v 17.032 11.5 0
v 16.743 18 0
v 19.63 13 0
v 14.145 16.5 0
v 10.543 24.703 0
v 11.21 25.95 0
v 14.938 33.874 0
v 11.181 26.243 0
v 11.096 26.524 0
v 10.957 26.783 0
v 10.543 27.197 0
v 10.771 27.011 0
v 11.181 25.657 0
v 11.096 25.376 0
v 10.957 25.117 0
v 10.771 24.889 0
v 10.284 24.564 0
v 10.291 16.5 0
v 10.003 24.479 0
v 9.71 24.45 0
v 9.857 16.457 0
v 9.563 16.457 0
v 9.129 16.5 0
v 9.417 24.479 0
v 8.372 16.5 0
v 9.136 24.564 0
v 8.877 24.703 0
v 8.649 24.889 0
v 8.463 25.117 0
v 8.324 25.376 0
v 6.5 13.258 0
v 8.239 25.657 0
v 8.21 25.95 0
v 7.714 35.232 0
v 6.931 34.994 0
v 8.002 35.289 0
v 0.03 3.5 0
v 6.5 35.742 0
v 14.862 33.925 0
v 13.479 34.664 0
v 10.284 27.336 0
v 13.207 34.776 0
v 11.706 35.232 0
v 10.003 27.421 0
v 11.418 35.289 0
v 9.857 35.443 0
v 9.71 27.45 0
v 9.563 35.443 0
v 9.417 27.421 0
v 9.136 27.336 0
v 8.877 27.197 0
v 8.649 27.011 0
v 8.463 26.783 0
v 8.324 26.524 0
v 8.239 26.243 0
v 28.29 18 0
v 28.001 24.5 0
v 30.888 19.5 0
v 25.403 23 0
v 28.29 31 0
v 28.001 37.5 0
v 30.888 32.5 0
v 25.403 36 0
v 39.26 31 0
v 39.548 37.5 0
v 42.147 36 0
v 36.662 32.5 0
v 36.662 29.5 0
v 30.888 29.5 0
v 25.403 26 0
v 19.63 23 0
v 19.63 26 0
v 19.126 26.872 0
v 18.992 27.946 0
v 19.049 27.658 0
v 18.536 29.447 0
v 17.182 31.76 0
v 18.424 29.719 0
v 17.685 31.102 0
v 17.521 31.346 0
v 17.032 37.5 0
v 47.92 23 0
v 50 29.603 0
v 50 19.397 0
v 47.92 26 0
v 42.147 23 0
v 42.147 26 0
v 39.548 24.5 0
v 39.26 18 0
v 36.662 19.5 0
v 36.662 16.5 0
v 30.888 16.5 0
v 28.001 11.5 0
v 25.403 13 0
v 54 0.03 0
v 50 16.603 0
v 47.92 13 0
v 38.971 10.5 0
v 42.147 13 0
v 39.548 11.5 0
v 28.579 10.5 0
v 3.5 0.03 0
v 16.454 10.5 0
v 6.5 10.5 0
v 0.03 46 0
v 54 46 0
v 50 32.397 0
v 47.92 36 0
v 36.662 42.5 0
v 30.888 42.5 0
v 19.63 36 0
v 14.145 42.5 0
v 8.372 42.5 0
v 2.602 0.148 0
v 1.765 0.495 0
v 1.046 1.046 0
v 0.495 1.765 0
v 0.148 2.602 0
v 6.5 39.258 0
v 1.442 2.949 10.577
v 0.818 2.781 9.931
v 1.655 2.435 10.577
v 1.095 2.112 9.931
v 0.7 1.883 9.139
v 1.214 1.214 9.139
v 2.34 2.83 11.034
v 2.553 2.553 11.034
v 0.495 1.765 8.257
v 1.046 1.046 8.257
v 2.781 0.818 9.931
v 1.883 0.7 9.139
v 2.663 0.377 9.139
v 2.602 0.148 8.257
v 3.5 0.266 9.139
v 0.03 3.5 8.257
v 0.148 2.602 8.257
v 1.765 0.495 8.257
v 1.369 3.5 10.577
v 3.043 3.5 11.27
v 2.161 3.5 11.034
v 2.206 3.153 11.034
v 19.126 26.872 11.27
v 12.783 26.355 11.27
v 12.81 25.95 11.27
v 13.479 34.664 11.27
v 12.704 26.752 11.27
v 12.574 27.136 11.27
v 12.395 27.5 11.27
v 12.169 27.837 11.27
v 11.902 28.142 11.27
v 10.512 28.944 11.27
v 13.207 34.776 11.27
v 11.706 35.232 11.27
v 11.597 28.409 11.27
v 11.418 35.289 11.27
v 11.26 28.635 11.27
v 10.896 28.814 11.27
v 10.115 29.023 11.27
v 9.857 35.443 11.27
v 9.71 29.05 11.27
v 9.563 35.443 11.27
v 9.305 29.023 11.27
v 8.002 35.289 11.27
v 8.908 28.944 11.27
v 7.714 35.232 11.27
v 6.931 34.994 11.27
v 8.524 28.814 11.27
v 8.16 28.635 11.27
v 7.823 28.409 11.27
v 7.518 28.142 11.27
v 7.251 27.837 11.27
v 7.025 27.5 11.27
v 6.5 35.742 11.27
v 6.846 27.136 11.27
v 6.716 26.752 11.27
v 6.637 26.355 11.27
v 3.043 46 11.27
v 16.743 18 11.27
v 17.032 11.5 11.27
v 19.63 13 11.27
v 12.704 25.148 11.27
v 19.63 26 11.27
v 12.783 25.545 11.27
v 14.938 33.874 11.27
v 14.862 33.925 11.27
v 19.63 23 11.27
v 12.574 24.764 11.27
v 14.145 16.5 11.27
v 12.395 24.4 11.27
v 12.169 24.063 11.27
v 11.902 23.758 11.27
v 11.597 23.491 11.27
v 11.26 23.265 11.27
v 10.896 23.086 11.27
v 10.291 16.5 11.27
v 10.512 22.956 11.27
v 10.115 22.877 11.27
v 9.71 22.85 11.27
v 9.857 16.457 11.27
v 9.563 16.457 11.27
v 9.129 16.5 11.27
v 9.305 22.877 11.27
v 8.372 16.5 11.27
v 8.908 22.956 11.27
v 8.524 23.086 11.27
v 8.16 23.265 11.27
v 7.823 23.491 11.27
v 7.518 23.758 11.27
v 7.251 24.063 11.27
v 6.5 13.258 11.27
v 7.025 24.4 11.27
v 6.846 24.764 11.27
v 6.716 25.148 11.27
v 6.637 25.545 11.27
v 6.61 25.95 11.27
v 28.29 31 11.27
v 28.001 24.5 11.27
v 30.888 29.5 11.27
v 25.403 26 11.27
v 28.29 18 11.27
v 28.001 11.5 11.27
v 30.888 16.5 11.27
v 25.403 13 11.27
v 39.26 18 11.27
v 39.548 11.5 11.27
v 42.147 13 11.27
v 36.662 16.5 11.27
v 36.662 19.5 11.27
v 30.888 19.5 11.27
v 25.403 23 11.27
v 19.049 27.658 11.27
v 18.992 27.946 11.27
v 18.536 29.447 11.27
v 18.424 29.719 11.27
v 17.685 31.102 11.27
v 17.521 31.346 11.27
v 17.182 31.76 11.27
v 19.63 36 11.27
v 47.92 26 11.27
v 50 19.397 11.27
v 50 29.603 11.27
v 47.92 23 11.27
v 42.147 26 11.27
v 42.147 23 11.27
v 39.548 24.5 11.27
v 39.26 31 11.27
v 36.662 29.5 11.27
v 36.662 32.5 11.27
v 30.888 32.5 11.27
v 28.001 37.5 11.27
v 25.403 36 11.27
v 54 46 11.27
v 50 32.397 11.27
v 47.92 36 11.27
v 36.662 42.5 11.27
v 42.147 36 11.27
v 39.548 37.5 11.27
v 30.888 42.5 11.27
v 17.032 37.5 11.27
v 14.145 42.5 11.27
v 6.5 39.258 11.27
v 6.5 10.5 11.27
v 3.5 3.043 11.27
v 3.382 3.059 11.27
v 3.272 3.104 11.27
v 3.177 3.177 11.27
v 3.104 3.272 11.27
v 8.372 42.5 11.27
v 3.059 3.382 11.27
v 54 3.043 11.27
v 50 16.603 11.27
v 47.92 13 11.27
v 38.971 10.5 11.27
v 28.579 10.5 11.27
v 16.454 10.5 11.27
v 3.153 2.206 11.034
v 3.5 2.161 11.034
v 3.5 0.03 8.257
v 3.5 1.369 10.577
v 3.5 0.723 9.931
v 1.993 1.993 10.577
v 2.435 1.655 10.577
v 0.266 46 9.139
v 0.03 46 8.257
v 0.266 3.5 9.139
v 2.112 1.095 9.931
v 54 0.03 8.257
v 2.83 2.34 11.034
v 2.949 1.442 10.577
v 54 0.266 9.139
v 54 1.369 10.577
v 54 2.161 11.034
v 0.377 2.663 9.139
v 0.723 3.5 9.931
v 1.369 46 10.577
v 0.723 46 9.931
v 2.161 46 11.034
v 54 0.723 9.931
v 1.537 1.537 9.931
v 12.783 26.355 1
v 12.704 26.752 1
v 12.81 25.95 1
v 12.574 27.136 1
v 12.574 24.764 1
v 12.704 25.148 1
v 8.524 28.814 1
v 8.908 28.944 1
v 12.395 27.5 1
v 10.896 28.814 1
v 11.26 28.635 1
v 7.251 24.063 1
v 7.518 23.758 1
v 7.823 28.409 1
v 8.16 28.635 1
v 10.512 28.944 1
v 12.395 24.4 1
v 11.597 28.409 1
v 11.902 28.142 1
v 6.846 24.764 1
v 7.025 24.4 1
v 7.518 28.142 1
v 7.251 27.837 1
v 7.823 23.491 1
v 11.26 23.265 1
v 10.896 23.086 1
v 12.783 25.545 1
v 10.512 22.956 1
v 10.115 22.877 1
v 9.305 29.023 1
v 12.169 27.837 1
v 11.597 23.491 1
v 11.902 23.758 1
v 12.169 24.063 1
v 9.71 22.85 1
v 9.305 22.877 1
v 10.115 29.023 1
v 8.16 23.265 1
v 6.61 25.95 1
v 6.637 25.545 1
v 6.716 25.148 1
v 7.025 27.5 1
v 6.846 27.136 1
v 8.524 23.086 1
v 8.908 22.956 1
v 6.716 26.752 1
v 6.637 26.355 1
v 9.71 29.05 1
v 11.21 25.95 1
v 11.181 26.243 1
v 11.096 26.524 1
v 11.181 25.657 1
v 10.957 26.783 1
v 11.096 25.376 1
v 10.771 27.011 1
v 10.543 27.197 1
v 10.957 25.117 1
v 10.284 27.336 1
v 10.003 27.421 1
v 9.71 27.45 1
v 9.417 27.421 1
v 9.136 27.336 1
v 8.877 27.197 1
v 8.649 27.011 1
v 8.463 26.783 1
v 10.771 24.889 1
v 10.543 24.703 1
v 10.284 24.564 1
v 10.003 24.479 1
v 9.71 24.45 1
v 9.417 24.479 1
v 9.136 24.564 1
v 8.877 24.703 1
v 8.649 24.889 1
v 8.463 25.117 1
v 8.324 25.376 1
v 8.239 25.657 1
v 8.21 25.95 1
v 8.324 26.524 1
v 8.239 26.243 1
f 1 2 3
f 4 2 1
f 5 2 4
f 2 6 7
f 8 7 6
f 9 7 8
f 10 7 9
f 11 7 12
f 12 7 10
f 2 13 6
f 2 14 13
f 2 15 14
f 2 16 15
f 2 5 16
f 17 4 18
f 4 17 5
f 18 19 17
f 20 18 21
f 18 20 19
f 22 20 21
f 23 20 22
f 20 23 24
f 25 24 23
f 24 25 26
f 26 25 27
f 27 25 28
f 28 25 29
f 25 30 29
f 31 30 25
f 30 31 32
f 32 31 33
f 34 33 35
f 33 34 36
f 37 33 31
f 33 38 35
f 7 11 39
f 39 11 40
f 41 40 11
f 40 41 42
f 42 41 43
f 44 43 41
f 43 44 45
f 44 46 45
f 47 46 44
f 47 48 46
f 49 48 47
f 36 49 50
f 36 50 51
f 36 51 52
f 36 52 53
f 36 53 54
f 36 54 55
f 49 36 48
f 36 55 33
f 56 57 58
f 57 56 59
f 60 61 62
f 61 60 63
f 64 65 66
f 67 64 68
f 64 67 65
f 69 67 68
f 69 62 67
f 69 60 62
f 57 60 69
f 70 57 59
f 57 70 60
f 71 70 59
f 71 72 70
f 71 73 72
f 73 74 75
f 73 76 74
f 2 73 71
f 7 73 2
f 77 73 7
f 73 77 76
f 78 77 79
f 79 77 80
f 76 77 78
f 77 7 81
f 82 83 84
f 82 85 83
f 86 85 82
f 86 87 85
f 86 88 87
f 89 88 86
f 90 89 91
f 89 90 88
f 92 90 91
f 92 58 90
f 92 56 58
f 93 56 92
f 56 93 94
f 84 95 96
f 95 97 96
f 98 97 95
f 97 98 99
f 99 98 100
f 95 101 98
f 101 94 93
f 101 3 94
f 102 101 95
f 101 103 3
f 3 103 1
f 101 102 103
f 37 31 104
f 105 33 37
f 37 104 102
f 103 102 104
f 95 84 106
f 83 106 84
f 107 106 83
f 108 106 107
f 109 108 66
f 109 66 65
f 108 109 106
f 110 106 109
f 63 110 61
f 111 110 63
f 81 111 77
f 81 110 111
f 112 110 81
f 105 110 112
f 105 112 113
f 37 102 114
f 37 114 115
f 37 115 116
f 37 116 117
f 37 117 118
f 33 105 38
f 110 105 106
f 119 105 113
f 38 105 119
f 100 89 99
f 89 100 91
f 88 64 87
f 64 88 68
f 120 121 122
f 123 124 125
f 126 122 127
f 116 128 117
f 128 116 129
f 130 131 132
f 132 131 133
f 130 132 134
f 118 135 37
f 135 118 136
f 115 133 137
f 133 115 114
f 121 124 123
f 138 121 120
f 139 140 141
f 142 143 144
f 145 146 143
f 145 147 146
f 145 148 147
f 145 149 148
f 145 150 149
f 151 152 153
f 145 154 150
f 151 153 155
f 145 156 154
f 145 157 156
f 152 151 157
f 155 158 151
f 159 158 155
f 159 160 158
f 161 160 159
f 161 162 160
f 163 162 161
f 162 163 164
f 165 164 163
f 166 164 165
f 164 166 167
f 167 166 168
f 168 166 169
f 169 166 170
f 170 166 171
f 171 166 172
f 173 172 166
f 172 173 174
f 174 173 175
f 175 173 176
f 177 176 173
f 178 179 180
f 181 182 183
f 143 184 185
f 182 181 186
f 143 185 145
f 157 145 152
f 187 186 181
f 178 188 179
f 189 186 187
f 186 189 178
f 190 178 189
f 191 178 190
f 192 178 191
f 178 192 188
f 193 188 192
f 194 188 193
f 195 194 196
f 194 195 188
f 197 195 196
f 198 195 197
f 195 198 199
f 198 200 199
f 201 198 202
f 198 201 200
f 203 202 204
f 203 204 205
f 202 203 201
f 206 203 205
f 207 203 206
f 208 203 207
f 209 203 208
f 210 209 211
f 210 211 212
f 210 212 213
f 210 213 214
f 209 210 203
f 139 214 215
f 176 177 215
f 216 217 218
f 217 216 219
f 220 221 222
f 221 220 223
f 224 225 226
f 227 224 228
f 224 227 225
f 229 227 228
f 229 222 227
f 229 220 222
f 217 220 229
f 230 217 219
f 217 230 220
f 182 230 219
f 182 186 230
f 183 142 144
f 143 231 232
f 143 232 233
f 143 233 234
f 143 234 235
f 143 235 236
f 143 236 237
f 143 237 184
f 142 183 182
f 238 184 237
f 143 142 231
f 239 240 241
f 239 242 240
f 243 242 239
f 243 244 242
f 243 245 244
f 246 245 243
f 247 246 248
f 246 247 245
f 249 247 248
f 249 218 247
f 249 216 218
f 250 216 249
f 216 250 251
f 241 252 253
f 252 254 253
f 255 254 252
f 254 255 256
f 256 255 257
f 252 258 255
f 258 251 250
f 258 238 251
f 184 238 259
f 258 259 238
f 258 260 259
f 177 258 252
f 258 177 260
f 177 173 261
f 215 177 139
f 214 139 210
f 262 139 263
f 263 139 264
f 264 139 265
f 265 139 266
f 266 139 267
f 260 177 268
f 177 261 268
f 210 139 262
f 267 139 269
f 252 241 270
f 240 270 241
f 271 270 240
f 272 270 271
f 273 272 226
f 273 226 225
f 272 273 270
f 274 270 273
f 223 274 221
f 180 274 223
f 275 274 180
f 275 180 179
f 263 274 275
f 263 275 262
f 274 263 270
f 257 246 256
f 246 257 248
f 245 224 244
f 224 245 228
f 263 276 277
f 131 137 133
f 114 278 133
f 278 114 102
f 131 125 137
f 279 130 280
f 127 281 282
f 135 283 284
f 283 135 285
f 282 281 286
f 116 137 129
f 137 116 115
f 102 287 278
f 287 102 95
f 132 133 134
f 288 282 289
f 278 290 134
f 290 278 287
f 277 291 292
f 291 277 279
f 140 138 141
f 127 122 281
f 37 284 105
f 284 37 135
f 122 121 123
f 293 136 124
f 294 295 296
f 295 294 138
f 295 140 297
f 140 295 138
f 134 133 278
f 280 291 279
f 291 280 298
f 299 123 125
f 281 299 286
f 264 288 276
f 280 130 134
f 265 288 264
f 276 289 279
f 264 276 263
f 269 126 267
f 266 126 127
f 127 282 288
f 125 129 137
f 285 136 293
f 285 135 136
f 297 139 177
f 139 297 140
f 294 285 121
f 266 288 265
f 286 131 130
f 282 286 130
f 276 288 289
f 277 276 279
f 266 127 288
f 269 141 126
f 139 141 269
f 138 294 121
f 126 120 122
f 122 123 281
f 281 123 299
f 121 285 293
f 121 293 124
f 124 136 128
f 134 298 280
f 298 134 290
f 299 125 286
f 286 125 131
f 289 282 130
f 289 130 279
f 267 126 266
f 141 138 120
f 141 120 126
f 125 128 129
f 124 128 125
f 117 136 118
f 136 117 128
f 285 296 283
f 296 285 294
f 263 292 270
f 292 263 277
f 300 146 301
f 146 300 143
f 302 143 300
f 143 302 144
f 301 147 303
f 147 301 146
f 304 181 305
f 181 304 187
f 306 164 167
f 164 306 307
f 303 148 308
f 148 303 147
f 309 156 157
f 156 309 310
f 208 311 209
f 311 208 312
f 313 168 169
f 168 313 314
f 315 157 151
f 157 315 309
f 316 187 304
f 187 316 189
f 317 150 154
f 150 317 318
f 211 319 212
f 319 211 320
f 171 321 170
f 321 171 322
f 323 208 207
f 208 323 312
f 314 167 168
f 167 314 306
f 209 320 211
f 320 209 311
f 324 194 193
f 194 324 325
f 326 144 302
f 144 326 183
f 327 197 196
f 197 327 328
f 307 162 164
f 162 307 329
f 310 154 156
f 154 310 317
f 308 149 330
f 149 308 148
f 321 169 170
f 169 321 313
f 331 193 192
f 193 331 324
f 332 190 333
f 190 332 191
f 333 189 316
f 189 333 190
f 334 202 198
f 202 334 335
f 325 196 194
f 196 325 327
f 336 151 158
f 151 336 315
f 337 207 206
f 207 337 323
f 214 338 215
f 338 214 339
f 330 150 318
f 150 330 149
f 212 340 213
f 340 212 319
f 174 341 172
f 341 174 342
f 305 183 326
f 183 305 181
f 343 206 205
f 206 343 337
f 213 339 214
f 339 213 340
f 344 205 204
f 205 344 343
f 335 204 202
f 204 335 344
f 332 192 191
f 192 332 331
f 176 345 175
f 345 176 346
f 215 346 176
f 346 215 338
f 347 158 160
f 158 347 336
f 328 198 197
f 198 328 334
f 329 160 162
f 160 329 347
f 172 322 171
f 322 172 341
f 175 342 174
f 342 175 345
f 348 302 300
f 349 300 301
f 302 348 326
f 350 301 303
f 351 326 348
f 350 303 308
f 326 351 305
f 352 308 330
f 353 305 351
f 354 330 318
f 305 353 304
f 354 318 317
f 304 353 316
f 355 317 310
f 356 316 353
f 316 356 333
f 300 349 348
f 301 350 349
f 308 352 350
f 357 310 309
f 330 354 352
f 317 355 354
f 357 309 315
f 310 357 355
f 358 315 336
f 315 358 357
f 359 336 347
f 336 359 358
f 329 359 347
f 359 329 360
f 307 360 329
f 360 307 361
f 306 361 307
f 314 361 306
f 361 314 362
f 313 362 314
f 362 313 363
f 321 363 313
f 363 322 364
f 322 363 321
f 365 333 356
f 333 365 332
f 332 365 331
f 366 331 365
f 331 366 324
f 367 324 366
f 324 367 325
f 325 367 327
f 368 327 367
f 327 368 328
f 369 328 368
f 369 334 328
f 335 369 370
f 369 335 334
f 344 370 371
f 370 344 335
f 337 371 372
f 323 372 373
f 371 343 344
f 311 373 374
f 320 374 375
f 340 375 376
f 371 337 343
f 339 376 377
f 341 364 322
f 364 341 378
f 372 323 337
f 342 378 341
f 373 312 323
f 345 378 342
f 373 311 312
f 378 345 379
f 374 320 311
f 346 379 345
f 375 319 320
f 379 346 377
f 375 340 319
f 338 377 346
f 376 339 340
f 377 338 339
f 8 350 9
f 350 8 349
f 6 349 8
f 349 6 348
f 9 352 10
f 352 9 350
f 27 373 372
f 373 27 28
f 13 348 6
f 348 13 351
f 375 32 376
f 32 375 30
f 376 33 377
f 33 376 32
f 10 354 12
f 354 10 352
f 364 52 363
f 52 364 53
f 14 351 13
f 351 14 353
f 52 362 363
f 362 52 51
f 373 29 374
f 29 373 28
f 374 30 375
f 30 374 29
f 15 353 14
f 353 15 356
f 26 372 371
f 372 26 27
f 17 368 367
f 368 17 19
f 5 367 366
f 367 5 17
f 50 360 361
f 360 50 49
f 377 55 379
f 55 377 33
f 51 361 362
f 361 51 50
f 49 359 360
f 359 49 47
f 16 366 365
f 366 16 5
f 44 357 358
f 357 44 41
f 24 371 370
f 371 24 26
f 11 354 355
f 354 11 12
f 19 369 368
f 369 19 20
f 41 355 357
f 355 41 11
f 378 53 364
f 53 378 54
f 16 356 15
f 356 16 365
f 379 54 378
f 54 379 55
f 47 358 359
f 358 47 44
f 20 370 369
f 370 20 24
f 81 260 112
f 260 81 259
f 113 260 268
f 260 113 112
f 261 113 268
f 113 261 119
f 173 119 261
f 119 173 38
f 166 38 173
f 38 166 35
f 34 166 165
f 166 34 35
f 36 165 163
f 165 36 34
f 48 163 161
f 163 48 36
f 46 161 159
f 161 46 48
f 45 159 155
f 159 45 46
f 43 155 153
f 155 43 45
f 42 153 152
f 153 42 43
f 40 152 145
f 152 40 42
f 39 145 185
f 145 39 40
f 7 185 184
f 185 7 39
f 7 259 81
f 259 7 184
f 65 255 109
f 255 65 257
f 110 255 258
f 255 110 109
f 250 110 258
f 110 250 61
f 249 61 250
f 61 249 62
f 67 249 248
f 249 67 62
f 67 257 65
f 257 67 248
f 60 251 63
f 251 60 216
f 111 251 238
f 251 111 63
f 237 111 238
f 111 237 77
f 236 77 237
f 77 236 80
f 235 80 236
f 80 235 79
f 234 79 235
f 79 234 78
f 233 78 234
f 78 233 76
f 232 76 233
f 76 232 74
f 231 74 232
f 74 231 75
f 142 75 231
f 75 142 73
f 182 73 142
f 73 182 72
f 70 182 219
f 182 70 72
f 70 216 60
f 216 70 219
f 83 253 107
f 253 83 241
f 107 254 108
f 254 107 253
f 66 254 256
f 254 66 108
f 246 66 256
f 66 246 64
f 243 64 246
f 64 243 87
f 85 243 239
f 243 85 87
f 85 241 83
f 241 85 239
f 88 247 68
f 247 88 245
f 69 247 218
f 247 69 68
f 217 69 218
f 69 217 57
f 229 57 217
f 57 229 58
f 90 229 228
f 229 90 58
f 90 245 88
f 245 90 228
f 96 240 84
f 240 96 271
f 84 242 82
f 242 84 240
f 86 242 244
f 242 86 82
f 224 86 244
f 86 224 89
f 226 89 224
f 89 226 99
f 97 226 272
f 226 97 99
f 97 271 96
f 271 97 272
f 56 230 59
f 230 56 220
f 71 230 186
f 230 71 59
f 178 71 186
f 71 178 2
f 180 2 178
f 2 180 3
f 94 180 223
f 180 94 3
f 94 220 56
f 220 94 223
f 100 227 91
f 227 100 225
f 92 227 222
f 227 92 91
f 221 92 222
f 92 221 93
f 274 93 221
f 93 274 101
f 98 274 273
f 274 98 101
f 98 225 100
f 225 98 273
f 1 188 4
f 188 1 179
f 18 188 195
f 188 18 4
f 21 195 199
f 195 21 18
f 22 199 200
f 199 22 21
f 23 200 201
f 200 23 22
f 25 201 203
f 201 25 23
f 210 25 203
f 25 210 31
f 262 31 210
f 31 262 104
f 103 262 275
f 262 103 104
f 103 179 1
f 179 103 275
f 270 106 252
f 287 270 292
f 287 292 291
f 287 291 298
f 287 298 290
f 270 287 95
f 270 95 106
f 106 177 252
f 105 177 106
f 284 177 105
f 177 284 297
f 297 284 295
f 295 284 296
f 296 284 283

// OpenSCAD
// =============================================================================
// Fuse Platform — Standalone Test Print
// =============================================================================
// Extracted from battery-tray-mtx35.scad to validate, before committing to a
// full tray print:
//   - platform slab thickness
//   - hex (honeycomb) weight-reduction pattern
//   - the 4 M5 mounting holes (2 per fuse holder): either press-fit rivet nuts
//     OR heat-set threaded inserts (toggle use_threaded_inserts below). The rivet
//     nuts cracked the boss on install; heat-set inserts melt in with no radial
//     press force, so they shouldn't split the plastic.
//
// The platform is rebased to the origin and laid FLAT (bottom face on Z=0) so it
// slices/prints directly. The tray body, heat shield, back support wall, and
// gussets are intentionally dropped — this is just the platform slab. The slab is
// thickened to 11.3mm here so the full 10mm heat-set inserts are housed inside a
// flat slab (no protruding stubs) — see platform_thickness below.
//
// Coordinate mapping from the parent file:
//   parent outer_w  -> Y = 0      (front of the rearward fuse footprint)
//   parent platform_bot_z -> Z = 0
//   parent platform_top_z -> Z = platform_thickness
// The parent's 5mm wall-join strip is retained at the front (Y < 0 before the
// final translate) so the slab is a faithful slice of the real part.
//
// PRINT MATERIAL: ASA recommended (engine bay heat), same as the tray.
// =============================================================================

// ---- PLATFORM ----
platform_x_width            = 108;  // X dimension of platform (mm)
platform_y_depth            = 82;   // Y dimension of the rearward fuse footprint (mm)
platform_thickness          = 11.3; // slab thickness (mm) — thickened from the original 8mm so the whole 10mm insert is housed inside a FLAT slab (= insert pocket 10.3 + 1mm below the tip). No protruding boss stubs -> prints flat. (Real tray keeps 8mm + local bosses; this is a test-print convenience.)
back_support_wall_thickness = 5;    // front wall-join strip retained from parent (mm)
platform_x_origin           = 0;    // X start position of platform

// ---- FUSE HOLDER DIMENSIONS (Blue Sea 5001-style MEGA) ----
fuse_holder_length          = 103.38; // long axis (along X — parallel to battery)
fuse_holder_width           = 38.10;  // short axis (along Y — stacked direction)
fuse_mount_hole_spacing     = 88.58;  // distance between the 2 mount-hole centers along X
fuse_gap                    = 2;      // gap between the two fuse holders along Y (mm)

// ---- ORIGINAL M5 RIVET NUT HOLES (replaced by heat-set inserts — kept for reference) ----
// fuse_mount_hole_dia         = 7.3;    // M5 rivet nut press-fit hole (6.91-8.51mm spec range)
// fuse_mount_rivet_grip_t     = 2.5;    // material thickness AT each rivet location (mm) — grip ledge the rivet bites into; set to rivet-nut spec max (2.5) to match the production tray
// fuse_mount_rivet_length     = 12.0;   // full rivet length from top of platform (mm)
// fuse_mount_counterbore_dia  = 11.0;   // counterbore diameter from underside (mm)

// ---- M5 THERMAL HEAT-SET INSERTS (active) ----
// On-hand inserts: M5, tapered brass, OD 7.0mm (wide knurled/grip end) -> 6.1mm
// (thin lead end), available in 10mm and 12mm lengths. The 10mm is the better
// match for this 8mm slab (12mm would need a 4mm boss stub and crowds the gussets
// on the real tray). Heat-set melts in — pilot just under the thin OD so the
// knurls bite, plus a shallow lead-in counterbore to seat the wide end square.
insert_length               = 10.0;   // chosen insert length (mm) — M5x10 (M5x12 also on hand)
insert_pilot_dia            = 6.2;    // pilot/melt hole dia (mm) — bumped from 6.1; the 6.1 test bore printed too tight in ASA for the insert to seat, so opened 0.1mm
insert_leadin_dia           = insert_pilot_dia;  // = pilot (6.1) -> NO wider mouth; the bore is a uniform 6.1mm column from the top. The tapered insert's 7mm wide end just melts into the straight 6.1 hole.
insert_leadin_depth         = 1.5;    // lead-in depth from the TOP face (mm) — moot while leadin_dia == pilot (kept so a flared mouth can be reintroduced by bumping leadin_dia)
insert_seat_clearance       = 0.3;    // extra pocket depth beyond insert length (mm) — so the insert seats fully flush at the top
insert_pocket_floor         = 1.0;    // solid floor left below the insert as a positive depth-stop (mm)
insert_stub_dia             = 16.0;   // downward stub OD (mm) — matches the 16mm rivet boss (fph_boss_dia) for a clean cylindrical extension
insert_drain                = true;   // cut a small center drain through the pocket floor so water/condensation can't pool in the hole (engine-bay duty)
insert_drain_dia            = 3.0;    // drain hole dia (mm) — smaller than the 6.1 pilot leaves an annular floor LEDGE as a depth-stop; set >= insert_pilot_dia to remove the floor entirely (fully open / through pocket)
// FLAT-SLAB CAPTURE: instead of stubs hanging below an 8mm slab, the whole platform
// is thickened to 11.3mm (= 10.3 pocket + 1mm floor) so the full 10mm insert is
// housed inside a flat slab that prints flat. The bore is a uniform 6.1mm column
// from the top face down 10.3mm; a 3mm center DRAIN then punches through the 1mm
// floor so condensation drains out the underside (floor survives as a ~1.55mm ring
// that doubles as a positive depth-stop). Stub logic auto-disables at this
// thickness: insert_length + seat_clearance + pocket_floor - platform_thickness
//   =  10 + 0.3 + 1.0 - 11.3  =  0  -> no stubs.

// ---- TOP-EDGE ROUNDING ----
include_fp_top_round        = true;
fp_top_round_radius         = 3.5;    // radius of rounded top edges of the platform (mm)

// ---- HEX THROUGH-CUTS (weight reduction) ----
include_fuse_platform_hex_cuts = true;
fph_hex_F           = 10.0;  // mm — hex flat-to-flat dimension
fph_hex_wall        = 3.0;   // mm — wall thickness between adjacent hexes
fph_perimeter_rim   = 4.0;   // mm — front/rear horizontal rim thickness
fph_mid_rib         = 4.0;   // mm — mid horizontal rib (in the fuse gap)
fph_boss_dia        = 16.0;  // mm — solid boss diameter around each rivet
fph_bay_inset       = 1.5;   // mm — visual margin: bay area shrunk before clipping the hex grid

// Column thickness for the 3 solid vertical "keeper" columns (gusset-aligned in
// the parent). Only used by the hex module to size those columns.
fp_gusset_thickness = 5;

// ---- TEST CROP ----
// Print only part of the platform to validate insert fit/grip without committing
// filament to the full slab.
//   "FULL"   = whole platform (both fuse rows, 4 holes)
//   "CORNER" = ONE corner, ONE hole — a real platform chunk (hex + rounded edge)
//   "FUSE1"  = near half (1 fuse row, 2 holes)
//   "FUSE2"  = far half  (1 fuse row, 2 holes)
//   "BOSS"   = a single ~30mm square coupon around ONE insert hole (fastest fit test)
print_section = "CORNER";

// =============================================================================
// ASSEMBLY (rebased to origin, flat on Z=0)
// =============================================================================
// World-space Y landmarks (module coords + the back_support_wall_thickness shift)
_pym     = (platform_y_depth - 2*fuse_holder_width - fuse_gap) / 2;
_f1c_y   = back_support_wall_thickness + _pym + fuse_holder_width/2;          // fuse1 row center
_f2c_y   = back_support_wall_thickness + _pym + fuse_holder_width + fuse_gap + fuse_holder_width/2;  // fuse2 row center
_split_y = (_f1c_y + _f2c_y) / 2;                                            // mid rib (row split)
// World-space X landmarks (the two mount holes share these X positions)
_pxm     = (platform_x_width - fuse_holder_length) / 2;
_hole_x_near = _pxm + (fuse_holder_length - fuse_mount_hole_spacing) / 2;
_split_x = _hole_x_near + fuse_mount_hole_spacing / 2;   // midpoint between the 2 X holes
_boss_half   = 15;  // half-size of the single-boss coupon (mm)

if (print_section == "FULL") {
    platform_assembly();
} else {
    intersection() {
        platform_assembly();
        if (print_section == "CORNER")
            // near-X / near-Y quadrant -> one hole, one rounded outer corner
            translate([-10, -10, -10])
                cube([_split_x + 10, _split_y + 10, platform_thickness + 20]);
        else if (print_section == "FUSE1")
            translate([-10, -10, -10])
                cube([platform_x_width + 20, _split_y + 10, platform_thickness + 20]);
        else if (print_section == "FUSE2")
            translate([-10, _split_y, -10])
                cube([platform_x_width + 20,
                      back_support_wall_thickness + platform_y_depth - _split_y + 10,
                      platform_thickness + 20]);
        else if (print_section == "BOSS")
            translate([_hole_x_near - _boss_half, _f1c_y - _boss_half, -10])
                cube([2*_boss_half, 2*_boss_half, platform_thickness + 20]);
    }
}

module platform_assembly() {
    translate([0, back_support_wall_thickness, 0])
        difference() {
            union() {
                platform_slab();
                insert_stubs();   // downward boss extensions (auto-disabled when slab is thick enough)
            }
            if (include_fuse_platform_hex_cuts) platform_hex_cuts();
            platform_holes();
        }
}

// =============================================================================
// MODULES
// =============================================================================

module platform_slab() {
    // Horizontal slab. All 4 outside top edges rounded via minkowski + sphere,
    // clipped to the original bounds to keep the bottom and side faces flat.
    y_front = -back_support_wall_thickness;                  // retained wall-join strip
    y_depth = back_support_wall_thickness + platform_y_depth;
    r = include_fp_top_round ? fp_top_round_radius : 0;

    if (r > 0) {
        intersection() {
            // Original bounding box clips the minkowski overhang on the bottom
            translate([platform_x_origin, y_front, 0])
                cube([platform_x_width, y_depth, platform_thickness]);

            // Inner core offset inward by r on all sides + top; bottom flush.
            // After minkowski with sphere(r) it grows back to the bounds.
            minkowski() {
                translate([platform_x_origin + r, y_front + r, 0])
                    cube([platform_x_width - 2*r,
                          y_depth - 2*r,
                          platform_thickness - r]);
                sphere(r=r, $fn=24);
            }
        }
    } else {
        translate([platform_x_origin, y_front, 0])
            cube([platform_x_width, y_depth, platform_thickness]);
    }
}

module platform_holes() {
    // 4 holes: 2 per fuse holder, 2 fuse holders stacked along Y.
    // Through-hole at rivet diameter (7.3mm); counterbore (11mm) from the bottom
    // leaves a 2mm rivet-grip layer at the top of the slab.
    platform_bot_z = 0;
    platform_top_z = platform_thickness;

    // X positions of the 2 mount holes (shared by both fuses, stacked along Y)
    platform_x_edge_margin = (platform_x_width - fuse_holder_length) / 2;
    fuse_x_start = platform_x_origin + platform_x_edge_margin;
    fuse_inset_from_end = (fuse_holder_length - fuse_mount_hole_spacing) / 2;
    hole_x_near = fuse_x_start + fuse_inset_from_end;
    hole_x_far  = hole_x_near + fuse_mount_hole_spacing;

    // Y centers of the 2 fuse holders
    platform_y_edge_margin = (platform_y_depth - 2*fuse_holder_width - fuse_gap) / 2;
    fuse1_y_start  = platform_y_edge_margin;                       // parent outer_w -> 0
    fuse2_y_start  = fuse1_y_start + fuse_holder_width + fuse_gap;
    fuse1_y_center = fuse1_y_start + fuse_holder_width / 2;
    fuse2_y_center = fuse2_y_start + fuse_holder_width / 2;

    // ---- HEAT-SET INSERT path (active) ----
    // Uniform 6.1mm bore at the thin OD so the brass melts in, sunk from the TOP
    // face deep enough to swallow the full insert (+ seat clearance), leaving a
    // 1mm floor below. A 3mm center drain then opens that floor to the underside.
    insert_pocket_depth = insert_length + insert_seat_clearance;
    pocket_bot_z = platform_top_z - insert_pocket_depth;
    stub_height  = max(0, insert_pocket_depth + insert_pocket_floor - platform_thickness);
    stub_bot_z   = -stub_height;
    for (hx = [hole_x_near, hole_x_far]) {
        for (hy = [fuse1_y_center, fuse2_y_center]) {
            translate([hx, hy, pocket_bot_z])
                cylinder(d=insert_pilot_dia, h=insert_pocket_depth + 1, $fn=48);
            translate([hx, hy, platform_top_z - insert_leadin_depth])
                cylinder(d=insert_leadin_dia, h=insert_leadin_depth + 1, $fn=48);
            // Center drain: punches through the floor from inside the pocket out
            // the bottom of the stub so condensation can't pool around the brass.
            if (insert_drain && insert_drain_dia > 0)
                translate([hx, hy, stub_bot_z - 1])
                    cylinder(d=insert_drain_dia,
                             h=(pocket_bot_z + 0.5) - (stub_bot_z - 1), $fn=32);
        }
    }

    // ---- ORIGINAL RIVET-NUT path (kept for reference) ----
    // Through-hole at rivet diameter (7.3mm) with an 11mm counterbore from the
    // underside, leaving a 2.5mm rivet-grip layer at the top of the slab.
    // counterbore_top_z = platform_top_z - fuse_mount_rivet_grip_t;  // grip layer stays at top
    // counterbore_clearance_depth = max(platform_thickness - fuse_mount_rivet_grip_t,
    //                                   fuse_mount_rivet_length - fuse_mount_rivet_grip_t);
    // counterbore_bot_z = counterbore_top_z - counterbore_clearance_depth;
    //
    // for (hx = [hole_x_near, hole_x_far]) {
    //     for (hy = [fuse1_y_center, fuse2_y_center]) {
    //         // Through-hole at rivet diameter through the full platform
    //         translate([hx, hy, platform_bot_z - 1])
    //             cylinder(d=fuse_mount_hole_dia, h=platform_thickness + 2, $fn=32);
    //         // Counterbore from the underside
    //         translate([hx, hy, counterbore_bot_z - 1])
    //             cylinder(d=fuse_mount_counterbore_dia, h=counterbore_clearance_depth + 2, $fn=48);
    //     }
    // }
}

module insert_stubs() {
    // Downward cylindrical extensions of each rivet boss. Because the 10mm insert
    // is longer than the 8mm slab, each boss grows a stub below the underside so
    // the full insert length is captured in solid material (top flush, 1mm floor).
    // Sized/positioned to sit exactly under the 16mm bosses, so the hex cuts (which
    // already exclude the boss footprint) never touch them.
    platform_top_z = platform_thickness;
    insert_pocket_depth = insert_length + insert_seat_clearance;
    stub_height = max(0, insert_pocket_depth + insert_pocket_floor - platform_thickness);

    // Hole positions (same math as platform_holes)
    platform_x_edge_margin = (platform_x_width - fuse_holder_length) / 2;
    fuse_x_start = platform_x_origin + platform_x_edge_margin;
    fuse_inset_from_end = (fuse_holder_length - fuse_mount_hole_spacing) / 2;
    hole_x_near = fuse_x_start + fuse_inset_from_end;
    hole_x_far  = hole_x_near + fuse_mount_hole_spacing;
    platform_y_edge_margin = (platform_y_depth - 2*fuse_holder_width - fuse_gap) / 2;
    fuse1_y_start  = platform_y_edge_margin;
    fuse2_y_start  = fuse1_y_start + fuse_holder_width + fuse_gap;
    fuse1_y_center = fuse1_y_start + fuse_holder_width / 2;
    fuse2_y_center = fuse2_y_start + fuse_holder_width / 2;

    if (stub_height > 0) {
        for (hx = [hole_x_near, hole_x_far]) {
            for (hy = [fuse1_y_center, fuse2_y_center]) {
                // From -stub_height up to +0.01 (slight overlap to weld onto slab)
                translate([hx, hy, -stub_height])
                    cylinder(d=insert_stub_dia, h=stub_height + 0.01, $fn=48);
            }
        }
    }
}

module platform_hex_cuts() {
    // Honeycomb through-cut. Cut shape = (bay area inset by fph_bay_inset)
    // INTERSECT (hex grid). Extruded through the full platform thickness.
    // Keeps: 3 solid vertical columns, front/mid/rear rims, 16mm rivet bosses.
    platform_bot_z = 0;

    // Rivet positions (replicate platform_holes logic)
    platform_x_edge_margin = (platform_x_width - fuse_holder_length) / 2;
    fuse_x_start = platform_x_origin + platform_x_edge_margin;
    fuse_inset_from_end = (fuse_holder_length - fuse_mount_hole_spacing) / 2;
    hole_x_near = fuse_x_start + fuse_inset_from_end;
    hole_x_far  = hole_x_near + fuse_mount_hole_spacing;
    platform_y_edge_margin = (platform_y_depth - 2*fuse_holder_width - fuse_gap) / 2;
    fuse1_y_start  = platform_y_edge_margin;
    fuse2_y_start  = fuse1_y_start + fuse_holder_width + fuse_gap;
    fuse1_y_center = fuse1_y_start + fuse_holder_width / 2;
    fuse2_y_center = fuse2_y_start + fuse_holder_width / 2;
    rib_mid_y = (fuse1_y_center + fuse2_y_center) / 2;

    // Column X positions (gusset-aligned in the parent)
    col_mid_x   = platform_x_origin + platform_x_width/2 - fp_gusset_thickness/2;
    col_right_x = platform_x_origin + platform_x_width - fp_gusset_thickness;

    // Hex tiling math: hexes spaced as if size F_eff = F + wall, drawn at size F
    F_eff = fph_hex_F + fph_hex_wall;
    s_eff = F_eff / sqrt(3);
    col_spacing_x = 1.5 * s_eff;          // X spacing between hex columns
    row_spacing_y = F_eff;                // Y spacing within a column
    col_y_offset  = F_eff / 2;            // Y phase shift between odd/even columns
    hex_d         = 2 * fph_hex_F / sqrt(3);  // vertex-to-vertex diameter of drawn hex

    n_cols = ceil(platform_x_width / col_spacing_x) + 2;
    n_rows = ceil(platform_y_depth / row_spacing_y) + 2;

    translate([0, 0, platform_bot_z - 1])
        linear_extrude(platform_thickness + 2)
            intersection() {
                // BAY AREA (inset for visual margin around keepers)
                offset(r = -fph_bay_inset)
                    difference() {
                        // Full rearward footprint
                        translate([platform_x_origin, 0])
                            square([platform_x_width, platform_y_depth]);
                        // KEEP: left column
                        translate([platform_x_origin, 0])
                            square([fp_gusset_thickness, platform_y_depth]);
                        // KEEP: middle column
                        translate([col_mid_x, 0])
                            square([fp_gusset_thickness, platform_y_depth]);
                        // KEEP: right column
                        translate([col_right_x, 0])
                            square([fp_gusset_thickness, platform_y_depth]);
                        // KEEP: front rim
                        translate([platform_x_origin, 0])
                            square([platform_x_width, fph_perimeter_rim]);
                        // KEEP: mid horizontal rib (in fuse gap)
                        translate([platform_x_origin, rib_mid_y - fph_mid_rib/2])
                            square([platform_x_width, fph_mid_rib]);
                        // KEEP: rear rim
                        translate([platform_x_origin, platform_y_depth - fph_perimeter_rim])
                            square([platform_x_width, fph_perimeter_rim]);
                        // KEEP: 4 rivet bosses
                        translate([hole_x_near, fuse1_y_center]) circle(d = fph_boss_dia, $fn = 32);
                        translate([hole_x_far,  fuse1_y_center]) circle(d = fph_boss_dia, $fn = 32);
                        translate([hole_x_near, fuse2_y_center]) circle(d = fph_boss_dia, $fn = 32);
                        translate([hole_x_far,  fuse2_y_center]) circle(d = fph_boss_dia, $fn = 32);
                    }

                // HEX GRID — flat-top hexes, offset columns.
                // CENTER-ONLY FILTER: only emit hexes whose center is inside the
                // inset bay area (drops sliver hexes); the outer intersection()
                // clips any partial overflow at bay edges.
                let(
                    front_y   = fph_perimeter_rim + fph_bay_inset,
                    mid_y_bot = rib_mid_y - fph_mid_rib/2 - fph_bay_inset,
                    mid_y_top = rib_mid_y + fph_mid_rib/2 + fph_bay_inset,
                    rear_y    = platform_y_depth - fph_perimeter_rim - fph_bay_inset,
                    left_x    = platform_x_origin + fp_gusset_thickness + fph_bay_inset,
                    mid_x_lo  = col_mid_x - fph_bay_inset,
                    mid_x_hi  = col_mid_x + fp_gusset_thickness + fph_bay_inset,
                    right_x   = col_right_x - fph_bay_inset,
                    bcd2      = (fph_boss_dia/2 + fph_bay_inset) * (fph_boss_dia/2 + fph_bay_inset)
                ) {
                    for (col = [0 : n_cols]) {
                        for (row = [-1 : n_rows]) {
                            cx = platform_x_origin + col * col_spacing_x;
                            cy = row * row_spacing_y
                                 + ((col % 2 == 0) ? 0 : col_y_offset);
                            in_bay_x = (cx > left_x   && cx < mid_x_lo)
                                    || (cx > mid_x_hi && cx < right_x);
                            in_bay_y = (cy > front_y  && cy < mid_y_bot)
                                    || (cy > mid_y_top && cy < rear_y);
                            d1sq = (cx - hole_x_near)*(cx - hole_x_near) + (cy - fuse1_y_center)*(cy - fuse1_y_center);
                            d2sq = (cx - hole_x_far) *(cx - hole_x_far)  + (cy - fuse1_y_center)*(cy - fuse1_y_center);
                            d3sq = (cx - hole_x_near)*(cx - hole_x_near) + (cy - fuse2_y_center)*(cy - fuse2_y_center);
                            d4sq = (cx - hole_x_far) *(cx - hole_x_far)  + (cy - fuse2_y_center)*(cy - fuse2_y_center);
                            boss_clear = d1sq > bcd2 && d2sq > bcd2 && d3sq > bcd2 && d4sq > bcd2;
                            if (in_bay_x && in_bay_y && boss_clear) {
                                translate([cx, cy])
                                    circle(d = hex_d, $fn = 6);
                            }
                        }
                    }
                }
            }
}

// =============================================================================
// CONSOLE NOTES
// =============================================================================
echo("============================================");
echo("FUSE PLATFORM TEST PRINT");
echo(str("Footprint: ", platform_x_width, " x ",
         back_support_wall_thickness + platform_y_depth, " x ", platform_thickness, " mm"));
echo(str("           ", platform_x_width/25.4, " x ",
         (back_support_wall_thickness + platform_y_depth)/25.4, " x ",
         platform_thickness/25.4, " inches"));
echo(str("M5 HEAT-SET insert pockets: uniform ", insert_pilot_dia,
         "mm bore, ", insert_length + insert_seat_clearance,
         "mm deep -> full ", insert_length, "mm insert sits flush in the ",
         platform_thickness, "mm slab (", insert_pocket_floor, "mm floor)."));
echo(insert_drain
     ? str("Center drain: ", insert_drain_dia, "mm through each pocket floor",
           insert_drain_dia >= insert_pilot_dia ? " (>= pilot -> floor fully open)." : " (annular ledge stop retained).")
     : "Center drain: DISABLED (blind floor, may trap condensation).");
// ORIGINAL rivet-nut note (kept for reference):
// echo("4x M5 rivet-nut holes: 7.3mm grip (top 2mm) / 11mm counterbore below.");
echo("PRINT IN ASA. Flat on bed, no supports needed.");
echo("============================================");
